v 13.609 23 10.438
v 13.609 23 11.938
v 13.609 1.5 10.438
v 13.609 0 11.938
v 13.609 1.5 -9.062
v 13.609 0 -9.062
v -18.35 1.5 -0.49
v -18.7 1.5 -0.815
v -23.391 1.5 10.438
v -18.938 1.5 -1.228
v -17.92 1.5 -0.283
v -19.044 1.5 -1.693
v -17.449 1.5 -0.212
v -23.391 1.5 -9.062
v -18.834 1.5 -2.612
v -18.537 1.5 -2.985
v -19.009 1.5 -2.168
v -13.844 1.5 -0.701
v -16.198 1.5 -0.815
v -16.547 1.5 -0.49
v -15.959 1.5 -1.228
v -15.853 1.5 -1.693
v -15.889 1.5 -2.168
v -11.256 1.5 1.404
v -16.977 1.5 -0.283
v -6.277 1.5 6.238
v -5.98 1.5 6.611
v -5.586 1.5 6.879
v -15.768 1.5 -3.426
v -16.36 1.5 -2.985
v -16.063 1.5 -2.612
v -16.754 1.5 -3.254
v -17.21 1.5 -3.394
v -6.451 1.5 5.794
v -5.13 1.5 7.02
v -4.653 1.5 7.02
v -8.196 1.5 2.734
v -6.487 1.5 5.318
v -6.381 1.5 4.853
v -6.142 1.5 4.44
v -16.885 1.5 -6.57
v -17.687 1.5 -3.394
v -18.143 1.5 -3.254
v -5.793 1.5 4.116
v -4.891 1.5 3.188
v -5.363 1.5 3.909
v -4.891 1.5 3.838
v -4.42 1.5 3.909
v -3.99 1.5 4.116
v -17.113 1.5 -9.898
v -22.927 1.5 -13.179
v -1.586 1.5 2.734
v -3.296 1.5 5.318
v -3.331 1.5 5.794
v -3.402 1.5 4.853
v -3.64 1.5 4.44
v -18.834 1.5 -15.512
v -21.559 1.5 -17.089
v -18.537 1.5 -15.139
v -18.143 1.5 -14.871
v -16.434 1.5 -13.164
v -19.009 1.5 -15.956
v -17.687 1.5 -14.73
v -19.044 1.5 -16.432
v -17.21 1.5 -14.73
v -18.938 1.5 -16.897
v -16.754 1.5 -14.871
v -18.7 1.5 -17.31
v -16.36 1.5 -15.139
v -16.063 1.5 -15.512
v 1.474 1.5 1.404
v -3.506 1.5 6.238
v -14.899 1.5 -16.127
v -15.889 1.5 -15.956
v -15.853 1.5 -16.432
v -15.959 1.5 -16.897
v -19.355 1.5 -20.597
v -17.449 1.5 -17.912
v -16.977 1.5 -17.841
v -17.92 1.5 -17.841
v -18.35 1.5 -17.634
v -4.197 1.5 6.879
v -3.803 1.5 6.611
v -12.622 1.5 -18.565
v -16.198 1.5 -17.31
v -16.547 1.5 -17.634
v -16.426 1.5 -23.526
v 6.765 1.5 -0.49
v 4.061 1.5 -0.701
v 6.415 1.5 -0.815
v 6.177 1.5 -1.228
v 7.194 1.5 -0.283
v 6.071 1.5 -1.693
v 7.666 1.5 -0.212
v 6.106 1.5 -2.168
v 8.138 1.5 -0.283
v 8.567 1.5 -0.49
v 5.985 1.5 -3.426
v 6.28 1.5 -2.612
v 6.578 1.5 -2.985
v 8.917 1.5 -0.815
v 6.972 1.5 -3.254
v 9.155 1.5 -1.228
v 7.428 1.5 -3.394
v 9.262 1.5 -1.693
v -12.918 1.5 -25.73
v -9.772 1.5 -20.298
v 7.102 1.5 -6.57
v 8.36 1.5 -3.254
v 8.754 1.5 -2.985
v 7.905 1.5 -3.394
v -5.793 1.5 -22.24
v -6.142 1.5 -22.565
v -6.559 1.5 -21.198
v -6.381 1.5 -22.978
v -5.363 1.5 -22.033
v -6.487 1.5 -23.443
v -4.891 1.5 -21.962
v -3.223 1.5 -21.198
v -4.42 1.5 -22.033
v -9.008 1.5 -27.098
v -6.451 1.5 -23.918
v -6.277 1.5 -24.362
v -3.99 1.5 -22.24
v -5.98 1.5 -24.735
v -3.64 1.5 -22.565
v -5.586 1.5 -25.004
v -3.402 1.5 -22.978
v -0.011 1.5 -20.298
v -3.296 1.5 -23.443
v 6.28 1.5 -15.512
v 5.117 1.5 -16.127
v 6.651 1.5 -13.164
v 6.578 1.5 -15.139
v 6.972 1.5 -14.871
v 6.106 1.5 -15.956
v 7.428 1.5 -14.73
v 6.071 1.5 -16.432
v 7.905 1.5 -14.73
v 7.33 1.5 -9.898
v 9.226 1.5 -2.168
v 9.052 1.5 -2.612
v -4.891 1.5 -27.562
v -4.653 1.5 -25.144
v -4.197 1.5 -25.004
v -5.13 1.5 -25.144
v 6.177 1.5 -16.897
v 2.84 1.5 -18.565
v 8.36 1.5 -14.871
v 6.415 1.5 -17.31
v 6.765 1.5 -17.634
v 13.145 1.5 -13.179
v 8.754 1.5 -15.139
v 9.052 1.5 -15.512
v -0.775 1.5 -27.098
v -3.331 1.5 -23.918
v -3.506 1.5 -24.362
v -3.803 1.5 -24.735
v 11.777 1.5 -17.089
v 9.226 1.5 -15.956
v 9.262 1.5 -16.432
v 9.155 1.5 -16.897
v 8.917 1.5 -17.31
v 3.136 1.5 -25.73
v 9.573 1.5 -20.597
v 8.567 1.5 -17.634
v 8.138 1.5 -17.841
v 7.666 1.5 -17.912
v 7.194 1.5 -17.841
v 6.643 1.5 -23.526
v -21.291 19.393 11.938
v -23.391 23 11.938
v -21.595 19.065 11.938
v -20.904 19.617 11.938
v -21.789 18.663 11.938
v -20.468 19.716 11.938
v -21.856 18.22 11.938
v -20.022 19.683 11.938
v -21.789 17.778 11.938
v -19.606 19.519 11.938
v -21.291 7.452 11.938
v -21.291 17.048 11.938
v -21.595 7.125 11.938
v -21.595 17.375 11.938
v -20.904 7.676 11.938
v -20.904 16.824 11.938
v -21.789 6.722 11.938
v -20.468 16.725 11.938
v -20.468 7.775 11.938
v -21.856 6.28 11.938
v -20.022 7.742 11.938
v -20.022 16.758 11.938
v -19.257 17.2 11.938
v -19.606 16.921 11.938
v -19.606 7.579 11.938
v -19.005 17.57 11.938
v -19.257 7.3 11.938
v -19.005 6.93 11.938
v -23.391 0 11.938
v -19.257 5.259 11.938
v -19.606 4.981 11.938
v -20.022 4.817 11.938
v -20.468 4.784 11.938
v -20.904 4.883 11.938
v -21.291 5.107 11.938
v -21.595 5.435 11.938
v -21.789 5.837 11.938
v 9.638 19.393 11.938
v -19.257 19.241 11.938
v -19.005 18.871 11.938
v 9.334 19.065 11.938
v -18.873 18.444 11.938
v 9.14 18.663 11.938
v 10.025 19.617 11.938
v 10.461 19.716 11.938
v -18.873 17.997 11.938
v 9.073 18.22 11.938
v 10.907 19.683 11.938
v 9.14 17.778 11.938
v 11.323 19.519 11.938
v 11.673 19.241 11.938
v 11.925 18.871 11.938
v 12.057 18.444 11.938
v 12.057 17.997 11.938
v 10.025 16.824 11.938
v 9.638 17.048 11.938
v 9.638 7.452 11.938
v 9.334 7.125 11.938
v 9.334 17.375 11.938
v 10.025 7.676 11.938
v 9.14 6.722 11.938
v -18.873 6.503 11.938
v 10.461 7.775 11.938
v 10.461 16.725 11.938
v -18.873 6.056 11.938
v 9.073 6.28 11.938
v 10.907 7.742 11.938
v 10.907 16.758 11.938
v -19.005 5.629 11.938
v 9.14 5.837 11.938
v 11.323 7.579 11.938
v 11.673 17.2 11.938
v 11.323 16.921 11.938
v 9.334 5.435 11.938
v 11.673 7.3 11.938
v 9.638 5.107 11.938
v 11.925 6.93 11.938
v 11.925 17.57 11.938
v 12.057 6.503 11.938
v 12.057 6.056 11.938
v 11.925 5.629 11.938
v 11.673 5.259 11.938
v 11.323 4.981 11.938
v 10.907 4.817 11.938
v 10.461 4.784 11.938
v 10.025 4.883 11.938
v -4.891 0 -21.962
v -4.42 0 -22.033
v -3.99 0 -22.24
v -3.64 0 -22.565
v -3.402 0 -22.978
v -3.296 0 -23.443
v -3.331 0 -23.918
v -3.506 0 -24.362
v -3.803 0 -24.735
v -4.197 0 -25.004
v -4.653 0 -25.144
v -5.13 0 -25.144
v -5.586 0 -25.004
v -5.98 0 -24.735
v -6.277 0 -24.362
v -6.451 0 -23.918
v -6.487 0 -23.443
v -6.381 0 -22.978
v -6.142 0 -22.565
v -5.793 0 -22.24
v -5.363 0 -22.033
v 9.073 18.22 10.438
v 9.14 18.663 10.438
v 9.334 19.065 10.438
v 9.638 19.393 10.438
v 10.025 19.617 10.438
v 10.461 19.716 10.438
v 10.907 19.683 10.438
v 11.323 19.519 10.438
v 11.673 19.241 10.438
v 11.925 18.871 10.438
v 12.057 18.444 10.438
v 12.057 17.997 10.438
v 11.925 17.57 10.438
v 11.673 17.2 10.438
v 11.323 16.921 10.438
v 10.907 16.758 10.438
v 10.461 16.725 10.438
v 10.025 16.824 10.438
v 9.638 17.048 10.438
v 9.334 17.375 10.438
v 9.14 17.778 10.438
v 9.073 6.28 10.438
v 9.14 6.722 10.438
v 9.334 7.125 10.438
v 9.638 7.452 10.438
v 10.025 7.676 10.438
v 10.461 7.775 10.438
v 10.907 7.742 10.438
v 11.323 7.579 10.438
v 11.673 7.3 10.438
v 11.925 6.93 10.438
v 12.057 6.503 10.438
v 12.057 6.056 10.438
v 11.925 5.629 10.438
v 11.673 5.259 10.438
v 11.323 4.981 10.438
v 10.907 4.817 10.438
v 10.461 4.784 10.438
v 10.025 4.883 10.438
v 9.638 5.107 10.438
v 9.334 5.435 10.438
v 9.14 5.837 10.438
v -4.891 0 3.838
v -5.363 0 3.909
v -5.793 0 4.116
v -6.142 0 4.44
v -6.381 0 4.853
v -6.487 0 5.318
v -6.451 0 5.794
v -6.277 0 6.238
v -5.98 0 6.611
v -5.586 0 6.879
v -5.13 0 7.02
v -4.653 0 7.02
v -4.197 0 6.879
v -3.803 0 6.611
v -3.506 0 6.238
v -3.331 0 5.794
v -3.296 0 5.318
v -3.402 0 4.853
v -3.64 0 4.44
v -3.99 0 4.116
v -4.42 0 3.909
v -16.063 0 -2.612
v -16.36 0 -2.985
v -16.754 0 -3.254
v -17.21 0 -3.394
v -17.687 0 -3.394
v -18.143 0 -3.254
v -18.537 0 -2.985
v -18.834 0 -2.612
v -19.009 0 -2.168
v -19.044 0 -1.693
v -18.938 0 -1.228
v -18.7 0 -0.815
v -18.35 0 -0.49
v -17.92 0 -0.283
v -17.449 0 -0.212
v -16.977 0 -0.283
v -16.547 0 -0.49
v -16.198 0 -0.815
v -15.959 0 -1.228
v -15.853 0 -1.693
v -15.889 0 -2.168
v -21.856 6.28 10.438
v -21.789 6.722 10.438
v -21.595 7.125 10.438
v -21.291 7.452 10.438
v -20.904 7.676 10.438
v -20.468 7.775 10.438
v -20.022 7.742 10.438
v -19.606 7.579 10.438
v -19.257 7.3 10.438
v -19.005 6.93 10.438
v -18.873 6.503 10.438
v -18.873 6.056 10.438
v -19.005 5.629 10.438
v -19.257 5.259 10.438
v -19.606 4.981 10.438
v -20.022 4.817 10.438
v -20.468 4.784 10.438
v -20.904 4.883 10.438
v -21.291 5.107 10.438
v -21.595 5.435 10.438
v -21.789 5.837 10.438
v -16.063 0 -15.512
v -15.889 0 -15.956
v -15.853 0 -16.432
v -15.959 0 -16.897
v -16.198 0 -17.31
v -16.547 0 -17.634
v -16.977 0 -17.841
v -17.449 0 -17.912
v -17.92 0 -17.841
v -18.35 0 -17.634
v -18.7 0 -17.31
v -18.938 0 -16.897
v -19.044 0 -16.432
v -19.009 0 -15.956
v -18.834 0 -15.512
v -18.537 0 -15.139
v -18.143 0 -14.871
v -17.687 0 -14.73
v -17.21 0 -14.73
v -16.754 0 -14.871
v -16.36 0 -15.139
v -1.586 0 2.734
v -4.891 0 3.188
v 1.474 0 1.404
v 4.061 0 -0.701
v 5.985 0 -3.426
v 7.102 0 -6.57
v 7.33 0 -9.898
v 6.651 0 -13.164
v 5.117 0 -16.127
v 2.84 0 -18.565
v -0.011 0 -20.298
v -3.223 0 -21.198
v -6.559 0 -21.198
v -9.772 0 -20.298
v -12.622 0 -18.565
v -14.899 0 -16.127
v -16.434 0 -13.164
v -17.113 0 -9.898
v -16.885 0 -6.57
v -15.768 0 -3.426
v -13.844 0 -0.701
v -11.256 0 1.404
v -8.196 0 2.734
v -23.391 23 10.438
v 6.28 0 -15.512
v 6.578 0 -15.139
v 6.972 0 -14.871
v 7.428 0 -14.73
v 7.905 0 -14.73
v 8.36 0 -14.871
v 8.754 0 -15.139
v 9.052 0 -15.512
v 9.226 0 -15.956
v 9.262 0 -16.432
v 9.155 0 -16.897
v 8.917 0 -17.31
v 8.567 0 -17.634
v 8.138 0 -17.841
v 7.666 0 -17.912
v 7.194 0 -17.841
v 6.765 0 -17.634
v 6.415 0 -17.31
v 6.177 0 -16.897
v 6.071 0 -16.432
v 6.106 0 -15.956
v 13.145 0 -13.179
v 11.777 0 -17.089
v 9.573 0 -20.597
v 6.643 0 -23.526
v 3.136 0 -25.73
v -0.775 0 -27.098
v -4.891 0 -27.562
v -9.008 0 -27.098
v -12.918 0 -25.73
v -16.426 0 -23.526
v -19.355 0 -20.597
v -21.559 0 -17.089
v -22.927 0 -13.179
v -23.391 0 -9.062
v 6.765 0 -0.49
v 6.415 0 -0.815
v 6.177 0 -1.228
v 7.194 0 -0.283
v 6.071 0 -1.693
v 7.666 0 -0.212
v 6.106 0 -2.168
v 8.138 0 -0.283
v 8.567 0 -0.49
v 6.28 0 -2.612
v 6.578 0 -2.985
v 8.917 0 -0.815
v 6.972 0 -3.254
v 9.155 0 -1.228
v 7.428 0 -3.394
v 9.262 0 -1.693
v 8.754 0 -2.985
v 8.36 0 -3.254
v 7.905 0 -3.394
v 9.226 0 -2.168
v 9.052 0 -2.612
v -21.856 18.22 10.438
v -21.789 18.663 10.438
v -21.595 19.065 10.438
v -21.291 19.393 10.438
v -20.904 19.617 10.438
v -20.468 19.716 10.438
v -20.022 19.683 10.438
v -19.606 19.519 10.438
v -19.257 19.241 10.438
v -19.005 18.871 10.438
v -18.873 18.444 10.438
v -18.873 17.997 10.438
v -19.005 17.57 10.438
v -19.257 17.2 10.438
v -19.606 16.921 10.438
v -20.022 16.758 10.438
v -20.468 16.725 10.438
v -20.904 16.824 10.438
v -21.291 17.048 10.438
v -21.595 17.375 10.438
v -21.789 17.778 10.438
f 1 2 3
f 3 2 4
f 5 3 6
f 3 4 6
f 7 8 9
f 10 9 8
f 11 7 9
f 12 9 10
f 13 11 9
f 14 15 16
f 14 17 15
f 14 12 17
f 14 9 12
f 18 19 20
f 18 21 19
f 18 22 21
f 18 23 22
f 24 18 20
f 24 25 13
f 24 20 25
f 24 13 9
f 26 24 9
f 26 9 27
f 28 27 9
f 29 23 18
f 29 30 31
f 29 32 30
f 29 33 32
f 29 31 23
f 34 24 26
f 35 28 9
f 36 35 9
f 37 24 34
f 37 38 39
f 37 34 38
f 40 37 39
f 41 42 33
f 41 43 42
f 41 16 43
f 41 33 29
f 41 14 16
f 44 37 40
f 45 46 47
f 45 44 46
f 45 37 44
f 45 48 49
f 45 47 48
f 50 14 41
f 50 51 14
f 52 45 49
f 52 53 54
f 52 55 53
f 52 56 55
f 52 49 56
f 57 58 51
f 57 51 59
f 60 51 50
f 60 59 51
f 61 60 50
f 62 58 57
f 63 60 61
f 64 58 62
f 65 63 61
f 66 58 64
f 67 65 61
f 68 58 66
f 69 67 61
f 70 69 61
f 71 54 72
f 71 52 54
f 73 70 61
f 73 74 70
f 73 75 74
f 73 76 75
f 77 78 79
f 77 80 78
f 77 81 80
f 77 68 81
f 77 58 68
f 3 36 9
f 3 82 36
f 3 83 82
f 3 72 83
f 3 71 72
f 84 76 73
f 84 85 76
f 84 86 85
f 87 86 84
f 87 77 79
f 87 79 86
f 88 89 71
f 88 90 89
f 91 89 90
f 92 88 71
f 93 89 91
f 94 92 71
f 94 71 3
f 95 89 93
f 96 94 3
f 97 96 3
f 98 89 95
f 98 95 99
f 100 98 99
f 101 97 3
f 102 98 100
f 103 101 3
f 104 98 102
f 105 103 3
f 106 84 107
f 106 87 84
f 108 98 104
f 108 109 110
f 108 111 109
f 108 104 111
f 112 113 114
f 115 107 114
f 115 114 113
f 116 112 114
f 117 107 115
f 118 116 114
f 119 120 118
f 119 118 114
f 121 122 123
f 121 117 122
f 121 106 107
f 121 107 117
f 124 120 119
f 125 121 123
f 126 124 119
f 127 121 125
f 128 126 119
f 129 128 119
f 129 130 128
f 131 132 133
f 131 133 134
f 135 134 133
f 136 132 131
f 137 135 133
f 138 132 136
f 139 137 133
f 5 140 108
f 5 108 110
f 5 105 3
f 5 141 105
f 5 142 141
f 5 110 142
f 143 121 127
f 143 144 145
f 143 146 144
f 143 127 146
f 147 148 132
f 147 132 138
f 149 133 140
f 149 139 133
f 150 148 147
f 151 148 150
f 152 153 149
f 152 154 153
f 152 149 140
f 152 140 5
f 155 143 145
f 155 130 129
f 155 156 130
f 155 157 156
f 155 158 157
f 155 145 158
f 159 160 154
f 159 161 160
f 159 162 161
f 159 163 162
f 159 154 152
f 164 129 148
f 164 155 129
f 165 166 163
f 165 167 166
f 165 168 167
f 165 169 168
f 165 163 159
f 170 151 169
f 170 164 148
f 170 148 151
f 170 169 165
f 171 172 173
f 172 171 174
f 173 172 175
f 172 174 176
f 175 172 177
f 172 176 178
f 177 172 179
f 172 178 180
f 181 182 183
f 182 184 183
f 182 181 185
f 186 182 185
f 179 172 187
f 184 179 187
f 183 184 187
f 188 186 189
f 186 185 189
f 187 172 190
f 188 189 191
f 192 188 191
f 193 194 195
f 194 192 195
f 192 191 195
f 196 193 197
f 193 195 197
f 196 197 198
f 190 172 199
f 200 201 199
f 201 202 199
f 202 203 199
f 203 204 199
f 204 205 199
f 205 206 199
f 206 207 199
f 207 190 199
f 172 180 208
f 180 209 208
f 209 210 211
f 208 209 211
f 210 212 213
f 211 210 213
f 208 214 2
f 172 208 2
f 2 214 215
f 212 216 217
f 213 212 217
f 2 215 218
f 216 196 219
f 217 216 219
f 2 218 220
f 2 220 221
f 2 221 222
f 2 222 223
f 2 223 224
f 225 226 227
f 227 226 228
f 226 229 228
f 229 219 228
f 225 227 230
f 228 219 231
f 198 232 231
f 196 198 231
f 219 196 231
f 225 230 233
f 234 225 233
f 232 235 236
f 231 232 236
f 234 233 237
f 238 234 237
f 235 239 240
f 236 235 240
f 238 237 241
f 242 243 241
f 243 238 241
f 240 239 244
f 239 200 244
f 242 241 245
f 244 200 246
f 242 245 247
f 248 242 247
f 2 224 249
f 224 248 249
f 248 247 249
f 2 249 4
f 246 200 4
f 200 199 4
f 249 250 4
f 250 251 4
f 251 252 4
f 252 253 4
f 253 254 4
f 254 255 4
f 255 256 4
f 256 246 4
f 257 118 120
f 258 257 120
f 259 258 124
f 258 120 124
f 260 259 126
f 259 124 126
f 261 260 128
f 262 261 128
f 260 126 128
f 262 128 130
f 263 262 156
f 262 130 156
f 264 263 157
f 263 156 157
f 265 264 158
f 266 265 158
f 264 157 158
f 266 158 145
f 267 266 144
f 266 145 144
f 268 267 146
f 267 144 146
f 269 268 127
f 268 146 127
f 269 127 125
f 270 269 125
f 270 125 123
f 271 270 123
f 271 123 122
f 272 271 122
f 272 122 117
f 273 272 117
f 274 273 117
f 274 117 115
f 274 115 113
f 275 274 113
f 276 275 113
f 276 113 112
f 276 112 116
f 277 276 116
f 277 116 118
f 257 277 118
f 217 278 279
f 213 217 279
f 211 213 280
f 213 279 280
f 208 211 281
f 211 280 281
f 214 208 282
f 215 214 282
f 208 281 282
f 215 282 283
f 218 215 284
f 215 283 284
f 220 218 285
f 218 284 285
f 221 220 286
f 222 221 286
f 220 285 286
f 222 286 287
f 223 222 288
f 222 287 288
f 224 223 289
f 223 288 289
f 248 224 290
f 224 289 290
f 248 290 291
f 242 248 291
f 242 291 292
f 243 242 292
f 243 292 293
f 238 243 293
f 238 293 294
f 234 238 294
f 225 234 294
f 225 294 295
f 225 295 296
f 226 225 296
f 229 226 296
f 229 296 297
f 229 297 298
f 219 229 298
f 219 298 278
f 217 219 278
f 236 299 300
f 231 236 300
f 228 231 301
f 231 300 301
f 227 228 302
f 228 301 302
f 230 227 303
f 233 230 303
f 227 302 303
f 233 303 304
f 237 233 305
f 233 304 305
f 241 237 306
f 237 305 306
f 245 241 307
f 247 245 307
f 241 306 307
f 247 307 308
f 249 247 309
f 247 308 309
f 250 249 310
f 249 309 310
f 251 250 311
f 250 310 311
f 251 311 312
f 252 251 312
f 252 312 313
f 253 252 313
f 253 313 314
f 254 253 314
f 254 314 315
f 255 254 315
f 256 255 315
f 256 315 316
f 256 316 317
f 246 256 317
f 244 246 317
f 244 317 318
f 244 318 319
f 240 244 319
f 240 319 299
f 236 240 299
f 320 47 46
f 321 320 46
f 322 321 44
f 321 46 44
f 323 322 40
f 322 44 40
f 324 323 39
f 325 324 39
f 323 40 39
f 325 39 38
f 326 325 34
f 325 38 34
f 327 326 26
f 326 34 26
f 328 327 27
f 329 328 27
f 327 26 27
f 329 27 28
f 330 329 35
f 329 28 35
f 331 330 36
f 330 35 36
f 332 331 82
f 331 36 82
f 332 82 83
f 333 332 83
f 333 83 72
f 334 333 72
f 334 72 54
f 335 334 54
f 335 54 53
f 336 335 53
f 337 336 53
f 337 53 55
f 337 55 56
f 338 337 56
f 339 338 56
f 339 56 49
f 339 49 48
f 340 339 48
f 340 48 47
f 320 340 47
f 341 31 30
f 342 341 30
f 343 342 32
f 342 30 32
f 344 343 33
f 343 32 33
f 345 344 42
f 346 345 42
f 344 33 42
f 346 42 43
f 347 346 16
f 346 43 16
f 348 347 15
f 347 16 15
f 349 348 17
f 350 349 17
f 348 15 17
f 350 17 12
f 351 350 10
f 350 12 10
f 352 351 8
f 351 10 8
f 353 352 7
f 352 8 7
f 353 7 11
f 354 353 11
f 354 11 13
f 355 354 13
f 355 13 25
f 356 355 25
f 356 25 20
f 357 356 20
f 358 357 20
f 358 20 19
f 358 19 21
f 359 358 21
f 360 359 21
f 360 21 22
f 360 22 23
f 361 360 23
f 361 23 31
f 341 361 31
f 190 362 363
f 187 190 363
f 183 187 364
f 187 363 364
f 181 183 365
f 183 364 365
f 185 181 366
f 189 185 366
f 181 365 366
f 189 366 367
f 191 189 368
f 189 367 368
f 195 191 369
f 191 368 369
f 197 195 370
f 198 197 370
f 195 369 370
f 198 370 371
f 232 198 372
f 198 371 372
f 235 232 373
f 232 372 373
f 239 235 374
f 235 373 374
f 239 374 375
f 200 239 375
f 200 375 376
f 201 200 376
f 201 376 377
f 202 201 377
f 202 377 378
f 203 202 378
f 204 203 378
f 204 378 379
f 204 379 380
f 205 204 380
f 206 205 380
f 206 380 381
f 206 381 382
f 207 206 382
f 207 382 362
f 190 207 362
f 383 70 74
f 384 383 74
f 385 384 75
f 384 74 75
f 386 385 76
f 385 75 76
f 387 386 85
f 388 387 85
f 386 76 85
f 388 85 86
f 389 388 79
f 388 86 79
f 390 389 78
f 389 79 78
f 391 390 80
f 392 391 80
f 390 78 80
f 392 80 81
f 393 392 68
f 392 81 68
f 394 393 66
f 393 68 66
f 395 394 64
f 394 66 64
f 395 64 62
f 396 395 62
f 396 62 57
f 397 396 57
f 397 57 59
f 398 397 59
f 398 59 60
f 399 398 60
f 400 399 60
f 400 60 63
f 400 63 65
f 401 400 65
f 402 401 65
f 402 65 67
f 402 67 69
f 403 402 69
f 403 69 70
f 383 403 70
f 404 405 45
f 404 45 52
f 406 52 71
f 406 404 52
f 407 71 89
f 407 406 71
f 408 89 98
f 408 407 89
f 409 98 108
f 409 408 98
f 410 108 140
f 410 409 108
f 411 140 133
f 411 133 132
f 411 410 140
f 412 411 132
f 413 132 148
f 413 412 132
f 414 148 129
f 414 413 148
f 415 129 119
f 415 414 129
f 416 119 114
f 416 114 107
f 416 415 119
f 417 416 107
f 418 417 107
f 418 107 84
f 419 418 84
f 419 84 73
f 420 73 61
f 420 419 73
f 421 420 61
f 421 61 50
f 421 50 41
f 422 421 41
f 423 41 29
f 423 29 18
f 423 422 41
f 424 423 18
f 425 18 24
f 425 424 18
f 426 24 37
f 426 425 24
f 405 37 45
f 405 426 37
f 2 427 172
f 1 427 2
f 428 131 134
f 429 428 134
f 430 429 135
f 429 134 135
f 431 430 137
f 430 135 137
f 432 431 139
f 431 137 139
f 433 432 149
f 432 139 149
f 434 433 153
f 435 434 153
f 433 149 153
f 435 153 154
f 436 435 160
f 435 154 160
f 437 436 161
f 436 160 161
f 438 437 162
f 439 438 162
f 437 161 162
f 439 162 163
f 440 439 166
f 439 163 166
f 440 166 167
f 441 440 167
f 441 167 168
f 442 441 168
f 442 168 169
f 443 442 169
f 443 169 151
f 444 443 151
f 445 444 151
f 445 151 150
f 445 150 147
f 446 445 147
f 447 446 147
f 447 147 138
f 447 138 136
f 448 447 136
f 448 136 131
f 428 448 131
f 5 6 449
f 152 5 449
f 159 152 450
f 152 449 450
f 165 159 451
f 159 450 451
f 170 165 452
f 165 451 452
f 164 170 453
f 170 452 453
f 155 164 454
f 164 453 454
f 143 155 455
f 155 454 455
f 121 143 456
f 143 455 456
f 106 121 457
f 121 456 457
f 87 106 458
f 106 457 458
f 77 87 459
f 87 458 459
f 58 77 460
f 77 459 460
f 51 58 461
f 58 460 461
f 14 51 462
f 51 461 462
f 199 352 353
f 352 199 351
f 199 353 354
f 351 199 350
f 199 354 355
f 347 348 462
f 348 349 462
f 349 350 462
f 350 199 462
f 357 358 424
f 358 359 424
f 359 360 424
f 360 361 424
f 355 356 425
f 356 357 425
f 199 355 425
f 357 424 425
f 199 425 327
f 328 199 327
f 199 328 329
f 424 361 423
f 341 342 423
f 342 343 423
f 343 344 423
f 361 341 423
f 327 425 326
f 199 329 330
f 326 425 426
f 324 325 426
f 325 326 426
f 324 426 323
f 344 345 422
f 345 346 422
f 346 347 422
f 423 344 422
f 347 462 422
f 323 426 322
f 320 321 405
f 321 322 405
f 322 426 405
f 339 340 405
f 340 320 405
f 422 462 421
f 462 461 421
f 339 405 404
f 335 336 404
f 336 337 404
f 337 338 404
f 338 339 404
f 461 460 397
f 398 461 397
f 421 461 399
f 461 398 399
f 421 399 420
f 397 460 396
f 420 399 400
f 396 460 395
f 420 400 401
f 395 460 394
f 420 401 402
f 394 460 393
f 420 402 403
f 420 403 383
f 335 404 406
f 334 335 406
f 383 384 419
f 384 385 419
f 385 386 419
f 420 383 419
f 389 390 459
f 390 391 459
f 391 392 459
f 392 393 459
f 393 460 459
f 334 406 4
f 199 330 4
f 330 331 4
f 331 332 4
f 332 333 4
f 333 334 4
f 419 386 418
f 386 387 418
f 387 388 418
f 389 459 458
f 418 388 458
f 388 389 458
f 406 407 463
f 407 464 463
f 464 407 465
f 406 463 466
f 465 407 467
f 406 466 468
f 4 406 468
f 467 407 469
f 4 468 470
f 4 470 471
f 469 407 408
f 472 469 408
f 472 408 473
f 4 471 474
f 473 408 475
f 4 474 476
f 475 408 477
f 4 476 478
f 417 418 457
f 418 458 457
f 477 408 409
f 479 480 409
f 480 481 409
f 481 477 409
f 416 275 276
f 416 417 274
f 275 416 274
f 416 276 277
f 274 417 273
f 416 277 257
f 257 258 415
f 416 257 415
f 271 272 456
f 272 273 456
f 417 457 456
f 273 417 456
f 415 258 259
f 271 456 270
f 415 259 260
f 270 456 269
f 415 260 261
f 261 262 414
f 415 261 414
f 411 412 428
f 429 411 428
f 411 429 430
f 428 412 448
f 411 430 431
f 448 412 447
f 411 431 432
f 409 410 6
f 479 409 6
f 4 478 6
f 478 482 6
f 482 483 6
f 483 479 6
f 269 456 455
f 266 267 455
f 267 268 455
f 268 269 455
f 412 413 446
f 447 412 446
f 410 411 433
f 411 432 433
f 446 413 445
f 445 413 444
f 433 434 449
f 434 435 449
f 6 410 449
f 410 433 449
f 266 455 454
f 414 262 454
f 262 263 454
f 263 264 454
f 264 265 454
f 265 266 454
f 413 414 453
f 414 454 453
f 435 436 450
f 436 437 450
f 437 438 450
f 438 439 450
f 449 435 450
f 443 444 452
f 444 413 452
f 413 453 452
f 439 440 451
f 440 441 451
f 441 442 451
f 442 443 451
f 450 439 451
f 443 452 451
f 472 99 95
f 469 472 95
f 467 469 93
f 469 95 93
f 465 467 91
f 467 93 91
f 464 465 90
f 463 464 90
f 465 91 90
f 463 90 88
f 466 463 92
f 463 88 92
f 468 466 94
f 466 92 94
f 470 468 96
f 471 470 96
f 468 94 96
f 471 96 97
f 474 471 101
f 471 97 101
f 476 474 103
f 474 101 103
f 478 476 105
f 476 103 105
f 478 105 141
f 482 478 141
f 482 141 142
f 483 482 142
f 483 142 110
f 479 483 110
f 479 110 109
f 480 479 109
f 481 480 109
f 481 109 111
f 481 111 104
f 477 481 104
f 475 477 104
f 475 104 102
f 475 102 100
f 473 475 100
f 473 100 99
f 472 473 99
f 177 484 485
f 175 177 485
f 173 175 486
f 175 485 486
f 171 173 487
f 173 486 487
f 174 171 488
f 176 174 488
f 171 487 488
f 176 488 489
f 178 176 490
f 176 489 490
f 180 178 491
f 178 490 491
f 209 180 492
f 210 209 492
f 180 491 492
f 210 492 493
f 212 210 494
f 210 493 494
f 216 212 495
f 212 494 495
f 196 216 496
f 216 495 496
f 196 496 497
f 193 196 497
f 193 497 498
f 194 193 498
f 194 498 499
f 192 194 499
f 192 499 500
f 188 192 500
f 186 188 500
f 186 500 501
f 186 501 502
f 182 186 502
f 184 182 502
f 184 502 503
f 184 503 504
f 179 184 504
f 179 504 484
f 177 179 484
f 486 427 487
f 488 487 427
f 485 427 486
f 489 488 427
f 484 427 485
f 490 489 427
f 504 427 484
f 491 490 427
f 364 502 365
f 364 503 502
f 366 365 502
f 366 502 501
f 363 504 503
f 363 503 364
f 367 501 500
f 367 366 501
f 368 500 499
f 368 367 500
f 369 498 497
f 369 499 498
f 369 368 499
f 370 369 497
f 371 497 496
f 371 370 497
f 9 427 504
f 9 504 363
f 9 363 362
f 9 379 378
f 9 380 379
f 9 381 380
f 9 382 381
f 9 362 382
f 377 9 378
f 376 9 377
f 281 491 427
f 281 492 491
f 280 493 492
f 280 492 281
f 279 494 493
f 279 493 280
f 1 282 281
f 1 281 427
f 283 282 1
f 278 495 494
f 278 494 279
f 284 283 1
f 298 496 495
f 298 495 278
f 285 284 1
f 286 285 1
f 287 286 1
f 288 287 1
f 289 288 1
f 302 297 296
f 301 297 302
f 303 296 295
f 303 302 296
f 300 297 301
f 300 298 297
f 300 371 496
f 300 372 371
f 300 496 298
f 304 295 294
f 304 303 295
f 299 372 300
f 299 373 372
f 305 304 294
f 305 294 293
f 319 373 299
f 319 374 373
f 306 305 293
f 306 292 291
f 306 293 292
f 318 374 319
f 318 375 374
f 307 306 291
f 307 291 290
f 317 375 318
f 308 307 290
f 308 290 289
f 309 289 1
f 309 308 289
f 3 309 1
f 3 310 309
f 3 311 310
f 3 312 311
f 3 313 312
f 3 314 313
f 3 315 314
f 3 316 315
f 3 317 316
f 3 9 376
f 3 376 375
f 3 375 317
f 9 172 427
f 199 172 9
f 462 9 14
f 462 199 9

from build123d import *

# Parameters (mm, degrees)
SKETCH1_R           = 12.25
BOSS_EXTRUDE1_DEPTH = 1.5
SKETCH4_W           = 37
SKETCH4_H           = 1.5
BOSS_EXTRUDE2_DEPTH = 21.5
SKETCH6_R           = 1.5
CUT_EXTRUDE2_DEPTH  = 10
SKETCH3_R           = 1.6
CUT_EXTRUDE3_DEPTH  = 10
CIRPATTERN1_COUNT   = 6


with BuildPart() as part:
    # Sketch1 → Boss-Extrude1 (new body)
    with BuildSketch(Plane(origin=(0, 0, 0), x_dir=(1, 0, 0), z_dir=(0, 1, 0))):
        with BuildLine():
            Line((-23.391313752, 9.062201448), (-23.391313752, -11.937798552))
            Line((-23.391313752, -11.937798552), (13.608686248, -11.937798552))
            Line((13.608686248, -11.937798552), (13.608686248, 9.062201448))
            ThreePointArc((13.608686248, 9.062201448), (-4.891313752, 27.562201448), (-23.391313752, 9.062201448))
        make_face()
        with Locations(Location((-4.891313752, 9.062201448, 0), (0, 0, 270))):
            Circle(SKETCH1_R, mode=Mode.SUBTRACT)
    extrude(amount=BOSS_EXTRUDE1_DEPTH)

    # Sketch4 → Boss-Extrude2 (add)
    with BuildSketch(Plane(origin=(0, 1.5, 0), x_dir=(1, 0, 0), z_dir=(0, 1, 0))):
        with Locations((-4.891313752, -11.187798552)):
            Rectangle(SKETCH4_W, SKETCH4_H)
    extrude(amount=BOSS_EXTRUDE2_DEPTH)

    # Sketch6 → Cut-Extrude2 (cut)
    with BuildSketch(Plane(origin=(0, 0, 10.437798552), x_dir=(-1, 0, 0), z_dir=(0, 0, -1))):
        with Locations((-10.573464155, 6.27963227)):
            Circle(SKETCH6_R)
        with Locations((20.356091659, 6.27963227)):
            Circle(SKETCH6_R)
        with Locations((20.356091659, 18.22036773)):
            Circle(SKETCH6_R)
        with Locations((-10.573464155, 18.22036773)):
            Circle(SKETCH6_R)
    extrude(amount=-CUT_EXTRUDE2_DEPTH, mode=Mode.SUBTRACT)

    # Sketch3 → Cut-Extrude3 (cut)
    with BuildSketch(Plane(origin=(0, 1.5, 0), x_dir=(1, 0, 0), z_dir=(0, 1, 0))):
        with Locations(Location((-4.891313752, 23.562201448, 0), (0, 0, 270))):
            Circle(SKETCH3_R)
    cut_extrude3 = extrude(amount=-CUT_EXTRUDE3_DEPTH, mode=Mode.SUBTRACT)

    # CirPattern1: Cut-Extrude3 ×6 about axis
    cirpattern1_axis = Axis((-4.891313752, 0, -9.062201448), (0, 1, 0))
    for i in range(1, CIRPATTERN1_COUNT):
        add(cut_extrude3.rotate(cirpattern1_axis, i * 360 / CIRPATTERN1_COUNT), mode=Mode.SUBTRACT)


solid = part.part
